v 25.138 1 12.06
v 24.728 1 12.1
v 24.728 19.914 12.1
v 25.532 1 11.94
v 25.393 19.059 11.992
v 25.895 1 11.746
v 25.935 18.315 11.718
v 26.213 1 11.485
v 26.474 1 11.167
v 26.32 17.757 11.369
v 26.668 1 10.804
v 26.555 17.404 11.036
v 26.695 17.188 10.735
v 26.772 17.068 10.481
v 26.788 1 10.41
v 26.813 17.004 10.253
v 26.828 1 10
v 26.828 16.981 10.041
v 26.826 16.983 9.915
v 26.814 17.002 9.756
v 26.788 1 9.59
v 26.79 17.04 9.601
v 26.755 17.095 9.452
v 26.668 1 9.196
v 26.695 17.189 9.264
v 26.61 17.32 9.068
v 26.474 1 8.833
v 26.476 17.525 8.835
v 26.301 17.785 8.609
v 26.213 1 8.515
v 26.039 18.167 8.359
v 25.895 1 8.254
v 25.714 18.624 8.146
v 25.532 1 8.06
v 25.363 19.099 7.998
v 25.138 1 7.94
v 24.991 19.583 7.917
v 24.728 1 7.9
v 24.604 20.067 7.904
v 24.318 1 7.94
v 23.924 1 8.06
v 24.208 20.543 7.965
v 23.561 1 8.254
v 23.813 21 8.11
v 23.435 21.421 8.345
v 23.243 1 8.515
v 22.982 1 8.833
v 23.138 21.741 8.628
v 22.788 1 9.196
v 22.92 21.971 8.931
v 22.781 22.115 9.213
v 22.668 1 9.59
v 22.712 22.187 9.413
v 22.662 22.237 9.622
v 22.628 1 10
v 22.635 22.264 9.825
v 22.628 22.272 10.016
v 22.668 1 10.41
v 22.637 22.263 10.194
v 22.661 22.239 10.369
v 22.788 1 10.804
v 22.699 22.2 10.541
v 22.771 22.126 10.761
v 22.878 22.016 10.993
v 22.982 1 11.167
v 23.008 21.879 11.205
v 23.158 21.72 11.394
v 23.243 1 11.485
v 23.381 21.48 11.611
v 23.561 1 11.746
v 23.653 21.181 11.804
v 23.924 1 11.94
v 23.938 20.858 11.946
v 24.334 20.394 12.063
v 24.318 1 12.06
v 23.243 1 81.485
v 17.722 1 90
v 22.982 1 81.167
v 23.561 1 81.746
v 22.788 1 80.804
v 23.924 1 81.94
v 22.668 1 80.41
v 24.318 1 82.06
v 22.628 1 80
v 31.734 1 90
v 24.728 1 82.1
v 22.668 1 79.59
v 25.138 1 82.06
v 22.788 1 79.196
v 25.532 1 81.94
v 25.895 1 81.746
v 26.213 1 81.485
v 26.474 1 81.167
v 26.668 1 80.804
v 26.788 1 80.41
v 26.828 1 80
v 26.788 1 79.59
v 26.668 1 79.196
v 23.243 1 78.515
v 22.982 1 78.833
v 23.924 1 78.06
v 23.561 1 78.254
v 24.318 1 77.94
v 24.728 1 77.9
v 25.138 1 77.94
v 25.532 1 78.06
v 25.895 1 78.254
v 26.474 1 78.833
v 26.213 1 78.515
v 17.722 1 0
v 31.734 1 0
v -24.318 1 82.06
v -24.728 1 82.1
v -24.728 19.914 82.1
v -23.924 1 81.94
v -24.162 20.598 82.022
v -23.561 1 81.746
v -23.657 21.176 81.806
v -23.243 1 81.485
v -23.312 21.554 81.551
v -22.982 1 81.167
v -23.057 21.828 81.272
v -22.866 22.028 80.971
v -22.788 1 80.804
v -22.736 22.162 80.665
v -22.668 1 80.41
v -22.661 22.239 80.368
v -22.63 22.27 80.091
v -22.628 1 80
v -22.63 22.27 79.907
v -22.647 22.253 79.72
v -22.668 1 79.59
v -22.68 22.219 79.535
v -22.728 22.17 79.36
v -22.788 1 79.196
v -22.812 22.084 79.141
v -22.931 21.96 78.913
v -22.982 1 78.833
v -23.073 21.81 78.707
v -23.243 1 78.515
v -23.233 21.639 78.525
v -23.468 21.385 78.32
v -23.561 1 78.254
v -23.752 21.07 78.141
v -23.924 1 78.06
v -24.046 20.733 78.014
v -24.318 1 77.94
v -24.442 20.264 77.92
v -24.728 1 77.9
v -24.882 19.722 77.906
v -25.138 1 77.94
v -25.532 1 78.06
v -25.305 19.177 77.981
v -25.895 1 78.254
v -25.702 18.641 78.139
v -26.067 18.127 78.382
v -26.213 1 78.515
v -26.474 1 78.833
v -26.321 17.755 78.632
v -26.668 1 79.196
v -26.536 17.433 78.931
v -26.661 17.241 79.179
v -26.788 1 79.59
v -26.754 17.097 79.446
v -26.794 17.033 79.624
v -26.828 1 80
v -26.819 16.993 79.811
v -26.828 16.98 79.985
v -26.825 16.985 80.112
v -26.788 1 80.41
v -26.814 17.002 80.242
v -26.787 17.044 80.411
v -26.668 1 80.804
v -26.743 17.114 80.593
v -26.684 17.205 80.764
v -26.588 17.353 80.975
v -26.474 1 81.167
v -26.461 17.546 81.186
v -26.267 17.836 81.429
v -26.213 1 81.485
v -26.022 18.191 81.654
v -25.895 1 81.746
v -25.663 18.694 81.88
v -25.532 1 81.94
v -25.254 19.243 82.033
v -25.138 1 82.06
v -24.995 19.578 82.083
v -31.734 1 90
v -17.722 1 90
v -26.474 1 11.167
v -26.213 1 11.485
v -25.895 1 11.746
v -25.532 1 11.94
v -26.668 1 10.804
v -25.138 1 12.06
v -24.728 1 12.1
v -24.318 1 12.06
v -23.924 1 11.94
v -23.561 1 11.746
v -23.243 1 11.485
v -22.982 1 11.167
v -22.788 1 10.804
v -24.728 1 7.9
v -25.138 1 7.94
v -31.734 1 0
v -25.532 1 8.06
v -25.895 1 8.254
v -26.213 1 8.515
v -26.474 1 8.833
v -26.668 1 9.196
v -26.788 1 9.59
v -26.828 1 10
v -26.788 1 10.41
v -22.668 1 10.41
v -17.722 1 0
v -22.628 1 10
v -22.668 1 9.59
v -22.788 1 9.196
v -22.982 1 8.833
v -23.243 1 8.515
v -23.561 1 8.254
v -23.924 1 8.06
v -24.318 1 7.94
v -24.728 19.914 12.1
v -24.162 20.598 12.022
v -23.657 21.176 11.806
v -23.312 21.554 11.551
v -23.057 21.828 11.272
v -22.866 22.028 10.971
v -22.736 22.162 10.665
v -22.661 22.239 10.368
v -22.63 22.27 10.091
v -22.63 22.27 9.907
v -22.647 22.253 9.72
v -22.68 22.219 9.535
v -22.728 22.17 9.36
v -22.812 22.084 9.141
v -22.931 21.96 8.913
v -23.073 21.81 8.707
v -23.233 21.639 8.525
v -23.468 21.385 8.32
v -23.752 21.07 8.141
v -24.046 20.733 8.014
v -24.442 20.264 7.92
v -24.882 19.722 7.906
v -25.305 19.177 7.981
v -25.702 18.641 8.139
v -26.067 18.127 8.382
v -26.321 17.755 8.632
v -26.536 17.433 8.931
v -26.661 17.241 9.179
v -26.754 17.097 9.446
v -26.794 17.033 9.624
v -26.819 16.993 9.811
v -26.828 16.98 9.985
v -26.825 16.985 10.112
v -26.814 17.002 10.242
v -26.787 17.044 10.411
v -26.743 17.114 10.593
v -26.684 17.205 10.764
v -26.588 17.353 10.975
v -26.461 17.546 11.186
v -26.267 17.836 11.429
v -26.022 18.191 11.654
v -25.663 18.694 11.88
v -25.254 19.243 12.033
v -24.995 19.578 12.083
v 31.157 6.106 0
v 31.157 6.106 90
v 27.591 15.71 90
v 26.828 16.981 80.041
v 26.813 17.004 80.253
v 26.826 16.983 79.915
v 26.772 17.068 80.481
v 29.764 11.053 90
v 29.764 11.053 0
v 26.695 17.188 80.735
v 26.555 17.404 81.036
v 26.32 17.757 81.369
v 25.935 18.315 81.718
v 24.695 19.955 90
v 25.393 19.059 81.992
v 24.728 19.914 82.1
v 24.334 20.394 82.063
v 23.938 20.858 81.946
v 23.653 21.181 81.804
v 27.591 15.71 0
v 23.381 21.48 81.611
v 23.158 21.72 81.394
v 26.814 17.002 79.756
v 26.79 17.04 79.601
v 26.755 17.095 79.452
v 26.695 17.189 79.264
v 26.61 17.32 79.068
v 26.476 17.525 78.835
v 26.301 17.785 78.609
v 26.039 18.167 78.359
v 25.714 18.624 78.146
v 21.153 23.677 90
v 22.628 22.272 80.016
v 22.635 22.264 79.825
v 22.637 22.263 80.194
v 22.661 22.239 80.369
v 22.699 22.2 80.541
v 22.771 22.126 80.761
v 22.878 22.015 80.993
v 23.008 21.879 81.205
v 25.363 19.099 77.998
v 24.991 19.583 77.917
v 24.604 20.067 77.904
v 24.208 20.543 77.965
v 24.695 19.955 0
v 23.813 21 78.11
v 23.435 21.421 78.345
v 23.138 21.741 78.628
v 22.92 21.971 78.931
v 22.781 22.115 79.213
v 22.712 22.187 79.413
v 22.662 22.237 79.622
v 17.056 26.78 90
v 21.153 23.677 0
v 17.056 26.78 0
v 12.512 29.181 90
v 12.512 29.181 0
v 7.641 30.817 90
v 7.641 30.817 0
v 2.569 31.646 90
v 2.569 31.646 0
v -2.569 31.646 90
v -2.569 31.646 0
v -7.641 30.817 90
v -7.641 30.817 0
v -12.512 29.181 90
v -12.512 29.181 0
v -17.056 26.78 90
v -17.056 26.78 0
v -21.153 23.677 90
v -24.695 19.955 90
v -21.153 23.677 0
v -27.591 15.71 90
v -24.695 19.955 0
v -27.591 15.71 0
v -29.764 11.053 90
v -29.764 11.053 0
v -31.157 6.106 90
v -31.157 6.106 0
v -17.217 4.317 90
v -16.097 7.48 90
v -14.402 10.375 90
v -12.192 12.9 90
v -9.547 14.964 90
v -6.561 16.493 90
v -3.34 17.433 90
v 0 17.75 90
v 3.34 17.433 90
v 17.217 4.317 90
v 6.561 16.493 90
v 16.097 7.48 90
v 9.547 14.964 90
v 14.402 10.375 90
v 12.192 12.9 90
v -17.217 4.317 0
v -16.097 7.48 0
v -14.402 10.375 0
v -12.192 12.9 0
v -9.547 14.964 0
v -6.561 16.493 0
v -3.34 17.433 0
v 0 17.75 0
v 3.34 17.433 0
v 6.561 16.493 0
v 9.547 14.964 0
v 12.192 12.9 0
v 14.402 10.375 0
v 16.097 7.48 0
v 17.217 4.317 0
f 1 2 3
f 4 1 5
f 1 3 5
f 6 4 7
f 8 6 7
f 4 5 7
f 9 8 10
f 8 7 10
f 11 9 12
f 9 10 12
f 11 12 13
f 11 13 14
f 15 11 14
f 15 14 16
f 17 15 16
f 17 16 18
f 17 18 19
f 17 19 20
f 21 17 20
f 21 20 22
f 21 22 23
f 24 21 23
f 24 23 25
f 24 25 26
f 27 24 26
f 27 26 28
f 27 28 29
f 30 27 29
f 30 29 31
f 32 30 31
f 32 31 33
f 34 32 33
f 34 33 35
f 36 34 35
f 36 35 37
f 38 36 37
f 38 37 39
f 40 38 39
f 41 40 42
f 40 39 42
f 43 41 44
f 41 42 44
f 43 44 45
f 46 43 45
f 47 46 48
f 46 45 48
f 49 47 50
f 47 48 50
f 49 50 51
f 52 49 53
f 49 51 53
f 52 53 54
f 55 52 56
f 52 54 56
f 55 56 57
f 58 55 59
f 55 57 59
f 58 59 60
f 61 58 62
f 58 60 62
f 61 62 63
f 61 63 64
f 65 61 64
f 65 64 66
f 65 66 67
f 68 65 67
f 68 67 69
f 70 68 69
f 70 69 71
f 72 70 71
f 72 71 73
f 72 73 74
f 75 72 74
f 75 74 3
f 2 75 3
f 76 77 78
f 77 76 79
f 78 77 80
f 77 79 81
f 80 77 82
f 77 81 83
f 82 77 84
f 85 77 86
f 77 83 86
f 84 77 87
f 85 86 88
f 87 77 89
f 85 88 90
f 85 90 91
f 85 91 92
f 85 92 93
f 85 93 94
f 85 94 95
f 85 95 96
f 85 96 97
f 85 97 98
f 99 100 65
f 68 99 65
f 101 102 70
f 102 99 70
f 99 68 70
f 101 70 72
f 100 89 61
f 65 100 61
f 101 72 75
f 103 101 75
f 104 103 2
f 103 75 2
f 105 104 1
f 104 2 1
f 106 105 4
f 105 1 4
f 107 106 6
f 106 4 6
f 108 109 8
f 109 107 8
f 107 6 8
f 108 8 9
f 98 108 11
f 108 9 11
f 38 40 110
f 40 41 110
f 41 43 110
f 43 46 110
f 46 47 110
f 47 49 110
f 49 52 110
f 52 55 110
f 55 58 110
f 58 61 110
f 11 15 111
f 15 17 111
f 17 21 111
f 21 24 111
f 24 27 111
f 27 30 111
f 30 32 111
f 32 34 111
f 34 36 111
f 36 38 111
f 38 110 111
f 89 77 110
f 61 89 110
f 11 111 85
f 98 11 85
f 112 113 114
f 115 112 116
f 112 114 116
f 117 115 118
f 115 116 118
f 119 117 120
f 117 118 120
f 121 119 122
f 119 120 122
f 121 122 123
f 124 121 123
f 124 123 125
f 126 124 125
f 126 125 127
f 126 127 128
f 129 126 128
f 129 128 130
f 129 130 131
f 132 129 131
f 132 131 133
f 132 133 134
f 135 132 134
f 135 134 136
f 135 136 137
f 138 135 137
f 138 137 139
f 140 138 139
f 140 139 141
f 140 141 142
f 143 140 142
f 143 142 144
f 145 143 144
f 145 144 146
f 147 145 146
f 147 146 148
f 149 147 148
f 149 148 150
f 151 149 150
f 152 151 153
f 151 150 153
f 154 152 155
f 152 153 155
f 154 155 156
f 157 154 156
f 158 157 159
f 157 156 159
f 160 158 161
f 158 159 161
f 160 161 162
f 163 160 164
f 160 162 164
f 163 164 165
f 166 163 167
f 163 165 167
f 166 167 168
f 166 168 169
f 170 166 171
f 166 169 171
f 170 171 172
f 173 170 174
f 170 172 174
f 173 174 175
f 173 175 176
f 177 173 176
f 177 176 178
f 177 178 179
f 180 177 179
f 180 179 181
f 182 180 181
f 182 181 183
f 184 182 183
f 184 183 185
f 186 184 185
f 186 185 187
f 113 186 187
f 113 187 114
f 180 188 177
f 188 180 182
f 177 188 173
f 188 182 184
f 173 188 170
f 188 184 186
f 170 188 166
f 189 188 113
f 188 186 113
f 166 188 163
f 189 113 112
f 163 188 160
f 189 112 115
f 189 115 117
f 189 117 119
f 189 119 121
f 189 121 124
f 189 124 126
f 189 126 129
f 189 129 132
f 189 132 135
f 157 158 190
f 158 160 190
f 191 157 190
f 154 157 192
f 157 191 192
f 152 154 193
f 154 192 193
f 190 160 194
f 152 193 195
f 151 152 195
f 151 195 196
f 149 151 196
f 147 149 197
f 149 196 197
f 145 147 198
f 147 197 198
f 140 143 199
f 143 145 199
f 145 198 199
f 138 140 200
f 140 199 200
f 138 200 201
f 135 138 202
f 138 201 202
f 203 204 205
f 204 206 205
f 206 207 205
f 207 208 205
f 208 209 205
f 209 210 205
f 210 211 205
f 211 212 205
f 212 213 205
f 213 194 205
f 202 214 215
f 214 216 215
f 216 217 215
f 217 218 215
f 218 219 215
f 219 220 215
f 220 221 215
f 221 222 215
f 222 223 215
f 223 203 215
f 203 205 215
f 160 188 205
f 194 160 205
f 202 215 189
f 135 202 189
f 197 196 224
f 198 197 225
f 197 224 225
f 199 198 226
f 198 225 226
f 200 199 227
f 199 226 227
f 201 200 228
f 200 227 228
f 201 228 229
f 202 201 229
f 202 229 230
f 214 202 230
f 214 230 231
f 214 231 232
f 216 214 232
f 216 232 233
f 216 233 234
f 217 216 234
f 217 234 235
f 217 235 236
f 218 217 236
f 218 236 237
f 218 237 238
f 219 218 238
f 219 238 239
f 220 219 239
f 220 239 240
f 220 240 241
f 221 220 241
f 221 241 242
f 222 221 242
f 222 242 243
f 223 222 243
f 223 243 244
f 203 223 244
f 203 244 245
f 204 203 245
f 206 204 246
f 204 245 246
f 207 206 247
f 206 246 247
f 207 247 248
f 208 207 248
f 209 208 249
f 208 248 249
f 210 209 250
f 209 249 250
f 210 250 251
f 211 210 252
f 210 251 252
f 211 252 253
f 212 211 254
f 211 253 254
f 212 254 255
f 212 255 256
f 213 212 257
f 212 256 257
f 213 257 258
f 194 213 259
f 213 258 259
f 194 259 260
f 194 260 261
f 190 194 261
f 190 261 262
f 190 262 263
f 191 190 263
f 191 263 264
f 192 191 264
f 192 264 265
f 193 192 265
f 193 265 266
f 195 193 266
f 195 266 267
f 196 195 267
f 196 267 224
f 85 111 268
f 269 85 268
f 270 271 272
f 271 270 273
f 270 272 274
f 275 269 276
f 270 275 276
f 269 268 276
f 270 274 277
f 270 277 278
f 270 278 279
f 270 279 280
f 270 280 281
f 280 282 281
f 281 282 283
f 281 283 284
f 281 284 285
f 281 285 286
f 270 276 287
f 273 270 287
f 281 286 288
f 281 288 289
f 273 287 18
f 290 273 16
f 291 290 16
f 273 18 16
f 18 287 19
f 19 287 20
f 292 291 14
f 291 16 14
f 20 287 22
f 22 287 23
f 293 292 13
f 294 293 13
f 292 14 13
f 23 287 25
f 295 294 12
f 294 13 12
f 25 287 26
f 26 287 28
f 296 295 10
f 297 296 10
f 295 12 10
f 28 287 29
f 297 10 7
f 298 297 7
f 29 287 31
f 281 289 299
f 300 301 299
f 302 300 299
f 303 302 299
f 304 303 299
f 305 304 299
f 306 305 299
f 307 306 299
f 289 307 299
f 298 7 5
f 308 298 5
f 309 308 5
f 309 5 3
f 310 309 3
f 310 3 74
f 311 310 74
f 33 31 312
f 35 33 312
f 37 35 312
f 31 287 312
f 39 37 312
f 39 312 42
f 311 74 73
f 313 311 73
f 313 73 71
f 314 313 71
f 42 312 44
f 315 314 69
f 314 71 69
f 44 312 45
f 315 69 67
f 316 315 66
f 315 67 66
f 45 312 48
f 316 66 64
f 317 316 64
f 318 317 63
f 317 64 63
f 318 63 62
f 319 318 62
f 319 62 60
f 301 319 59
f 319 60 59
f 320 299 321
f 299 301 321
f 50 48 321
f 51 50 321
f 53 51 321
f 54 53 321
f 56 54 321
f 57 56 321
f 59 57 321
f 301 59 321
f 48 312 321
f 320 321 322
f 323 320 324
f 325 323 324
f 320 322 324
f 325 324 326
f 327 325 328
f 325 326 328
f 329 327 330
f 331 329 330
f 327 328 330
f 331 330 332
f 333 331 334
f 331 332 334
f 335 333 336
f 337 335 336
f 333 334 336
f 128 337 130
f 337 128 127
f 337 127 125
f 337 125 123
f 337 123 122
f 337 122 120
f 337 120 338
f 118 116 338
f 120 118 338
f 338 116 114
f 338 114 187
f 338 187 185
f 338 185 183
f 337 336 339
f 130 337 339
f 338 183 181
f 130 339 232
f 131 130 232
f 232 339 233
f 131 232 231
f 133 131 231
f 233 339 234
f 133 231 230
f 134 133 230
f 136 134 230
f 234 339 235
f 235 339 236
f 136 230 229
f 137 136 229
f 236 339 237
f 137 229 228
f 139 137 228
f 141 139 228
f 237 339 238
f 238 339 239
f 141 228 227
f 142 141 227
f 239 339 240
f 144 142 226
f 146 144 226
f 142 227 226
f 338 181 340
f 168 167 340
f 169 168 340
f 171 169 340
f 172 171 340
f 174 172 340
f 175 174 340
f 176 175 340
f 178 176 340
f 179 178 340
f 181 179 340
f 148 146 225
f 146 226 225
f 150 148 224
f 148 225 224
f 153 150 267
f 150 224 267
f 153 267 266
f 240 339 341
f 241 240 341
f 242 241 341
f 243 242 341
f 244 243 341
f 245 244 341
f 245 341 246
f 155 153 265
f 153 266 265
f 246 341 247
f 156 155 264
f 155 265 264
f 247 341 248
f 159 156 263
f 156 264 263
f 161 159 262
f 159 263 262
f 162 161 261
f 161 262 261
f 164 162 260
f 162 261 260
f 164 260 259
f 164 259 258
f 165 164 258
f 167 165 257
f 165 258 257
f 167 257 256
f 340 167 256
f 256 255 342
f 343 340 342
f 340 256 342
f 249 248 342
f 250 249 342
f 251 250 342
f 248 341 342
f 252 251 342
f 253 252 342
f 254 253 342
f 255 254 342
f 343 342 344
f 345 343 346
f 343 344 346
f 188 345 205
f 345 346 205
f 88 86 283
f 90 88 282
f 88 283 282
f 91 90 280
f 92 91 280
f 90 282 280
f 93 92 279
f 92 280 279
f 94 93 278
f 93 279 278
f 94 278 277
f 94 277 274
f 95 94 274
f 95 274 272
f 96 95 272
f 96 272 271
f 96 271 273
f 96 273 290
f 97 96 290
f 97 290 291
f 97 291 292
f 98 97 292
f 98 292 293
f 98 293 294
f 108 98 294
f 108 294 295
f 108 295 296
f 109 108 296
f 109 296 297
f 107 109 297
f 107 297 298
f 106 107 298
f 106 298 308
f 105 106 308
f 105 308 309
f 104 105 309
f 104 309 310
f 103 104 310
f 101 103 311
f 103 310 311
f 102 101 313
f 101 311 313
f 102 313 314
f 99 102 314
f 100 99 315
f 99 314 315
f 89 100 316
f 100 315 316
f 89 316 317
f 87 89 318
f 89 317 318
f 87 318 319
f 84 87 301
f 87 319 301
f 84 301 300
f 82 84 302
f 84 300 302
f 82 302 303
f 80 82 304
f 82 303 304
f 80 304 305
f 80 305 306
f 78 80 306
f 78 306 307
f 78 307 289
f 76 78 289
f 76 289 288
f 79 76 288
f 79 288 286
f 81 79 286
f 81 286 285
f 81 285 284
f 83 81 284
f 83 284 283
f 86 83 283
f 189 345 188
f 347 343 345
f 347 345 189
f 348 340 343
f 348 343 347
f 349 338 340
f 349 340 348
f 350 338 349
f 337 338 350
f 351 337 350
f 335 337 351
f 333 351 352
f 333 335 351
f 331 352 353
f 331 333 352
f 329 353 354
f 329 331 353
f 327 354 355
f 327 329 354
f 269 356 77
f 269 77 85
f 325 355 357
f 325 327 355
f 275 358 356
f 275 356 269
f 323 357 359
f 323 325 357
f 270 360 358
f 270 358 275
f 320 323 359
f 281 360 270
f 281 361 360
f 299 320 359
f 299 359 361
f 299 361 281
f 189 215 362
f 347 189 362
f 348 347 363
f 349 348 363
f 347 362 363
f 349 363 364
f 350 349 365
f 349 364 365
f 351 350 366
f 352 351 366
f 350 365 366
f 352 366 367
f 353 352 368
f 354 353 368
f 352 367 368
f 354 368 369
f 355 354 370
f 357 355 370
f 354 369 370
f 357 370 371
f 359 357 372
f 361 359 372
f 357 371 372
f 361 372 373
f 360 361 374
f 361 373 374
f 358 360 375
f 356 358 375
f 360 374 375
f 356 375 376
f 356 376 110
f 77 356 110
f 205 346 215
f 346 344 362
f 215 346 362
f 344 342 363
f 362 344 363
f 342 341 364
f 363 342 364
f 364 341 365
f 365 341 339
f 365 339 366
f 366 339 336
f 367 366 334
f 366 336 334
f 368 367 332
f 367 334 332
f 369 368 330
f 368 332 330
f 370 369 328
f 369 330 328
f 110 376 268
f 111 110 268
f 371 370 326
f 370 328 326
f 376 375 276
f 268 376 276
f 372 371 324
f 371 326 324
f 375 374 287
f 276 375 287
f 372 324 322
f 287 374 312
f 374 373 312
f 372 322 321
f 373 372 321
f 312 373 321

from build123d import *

# Parameters (mm, degrees)
BOSS_EXTRUDE1_DEPTH         = 90
TAP_DRILL_FOR_M5X0_8_TAP1_D = 4.2


with BuildPart() as part:
    # Sketch1 → Boss-Extrude1 (new body)
    with BuildSketch(Plane.XY):
        with BuildLine():
            Line((-31.734248061, 1), (-17.721808598, 1))
            ThreePointArc((-17.721808598, 1), (0, 17.75), (17.721808598, 1))
            Line((17.721808598, 1), (31.734248061, 1))
            ThreePointArc((31.734248061, 1), (0, 31.75), (-31.734248061, 1))
        make_face()
    extrude(amount=BOSS_EXTRUDE1_DEPTH)

    # Tap Drill for M5x0.8 Tap1 (through all)
    with Locations(Plane(origin=(-24.72802833, 1, 80), x_dir=(0, 0, -1), z_dir=(0, -1, 0))):
        with Locations((0, 0), (70, 0), (0, 49.45605666), (70, 49.45605666)):
            Hole(TAP_DRILL_FOR_M5X0_8_TAP1_D / 2)


solid = part.part
